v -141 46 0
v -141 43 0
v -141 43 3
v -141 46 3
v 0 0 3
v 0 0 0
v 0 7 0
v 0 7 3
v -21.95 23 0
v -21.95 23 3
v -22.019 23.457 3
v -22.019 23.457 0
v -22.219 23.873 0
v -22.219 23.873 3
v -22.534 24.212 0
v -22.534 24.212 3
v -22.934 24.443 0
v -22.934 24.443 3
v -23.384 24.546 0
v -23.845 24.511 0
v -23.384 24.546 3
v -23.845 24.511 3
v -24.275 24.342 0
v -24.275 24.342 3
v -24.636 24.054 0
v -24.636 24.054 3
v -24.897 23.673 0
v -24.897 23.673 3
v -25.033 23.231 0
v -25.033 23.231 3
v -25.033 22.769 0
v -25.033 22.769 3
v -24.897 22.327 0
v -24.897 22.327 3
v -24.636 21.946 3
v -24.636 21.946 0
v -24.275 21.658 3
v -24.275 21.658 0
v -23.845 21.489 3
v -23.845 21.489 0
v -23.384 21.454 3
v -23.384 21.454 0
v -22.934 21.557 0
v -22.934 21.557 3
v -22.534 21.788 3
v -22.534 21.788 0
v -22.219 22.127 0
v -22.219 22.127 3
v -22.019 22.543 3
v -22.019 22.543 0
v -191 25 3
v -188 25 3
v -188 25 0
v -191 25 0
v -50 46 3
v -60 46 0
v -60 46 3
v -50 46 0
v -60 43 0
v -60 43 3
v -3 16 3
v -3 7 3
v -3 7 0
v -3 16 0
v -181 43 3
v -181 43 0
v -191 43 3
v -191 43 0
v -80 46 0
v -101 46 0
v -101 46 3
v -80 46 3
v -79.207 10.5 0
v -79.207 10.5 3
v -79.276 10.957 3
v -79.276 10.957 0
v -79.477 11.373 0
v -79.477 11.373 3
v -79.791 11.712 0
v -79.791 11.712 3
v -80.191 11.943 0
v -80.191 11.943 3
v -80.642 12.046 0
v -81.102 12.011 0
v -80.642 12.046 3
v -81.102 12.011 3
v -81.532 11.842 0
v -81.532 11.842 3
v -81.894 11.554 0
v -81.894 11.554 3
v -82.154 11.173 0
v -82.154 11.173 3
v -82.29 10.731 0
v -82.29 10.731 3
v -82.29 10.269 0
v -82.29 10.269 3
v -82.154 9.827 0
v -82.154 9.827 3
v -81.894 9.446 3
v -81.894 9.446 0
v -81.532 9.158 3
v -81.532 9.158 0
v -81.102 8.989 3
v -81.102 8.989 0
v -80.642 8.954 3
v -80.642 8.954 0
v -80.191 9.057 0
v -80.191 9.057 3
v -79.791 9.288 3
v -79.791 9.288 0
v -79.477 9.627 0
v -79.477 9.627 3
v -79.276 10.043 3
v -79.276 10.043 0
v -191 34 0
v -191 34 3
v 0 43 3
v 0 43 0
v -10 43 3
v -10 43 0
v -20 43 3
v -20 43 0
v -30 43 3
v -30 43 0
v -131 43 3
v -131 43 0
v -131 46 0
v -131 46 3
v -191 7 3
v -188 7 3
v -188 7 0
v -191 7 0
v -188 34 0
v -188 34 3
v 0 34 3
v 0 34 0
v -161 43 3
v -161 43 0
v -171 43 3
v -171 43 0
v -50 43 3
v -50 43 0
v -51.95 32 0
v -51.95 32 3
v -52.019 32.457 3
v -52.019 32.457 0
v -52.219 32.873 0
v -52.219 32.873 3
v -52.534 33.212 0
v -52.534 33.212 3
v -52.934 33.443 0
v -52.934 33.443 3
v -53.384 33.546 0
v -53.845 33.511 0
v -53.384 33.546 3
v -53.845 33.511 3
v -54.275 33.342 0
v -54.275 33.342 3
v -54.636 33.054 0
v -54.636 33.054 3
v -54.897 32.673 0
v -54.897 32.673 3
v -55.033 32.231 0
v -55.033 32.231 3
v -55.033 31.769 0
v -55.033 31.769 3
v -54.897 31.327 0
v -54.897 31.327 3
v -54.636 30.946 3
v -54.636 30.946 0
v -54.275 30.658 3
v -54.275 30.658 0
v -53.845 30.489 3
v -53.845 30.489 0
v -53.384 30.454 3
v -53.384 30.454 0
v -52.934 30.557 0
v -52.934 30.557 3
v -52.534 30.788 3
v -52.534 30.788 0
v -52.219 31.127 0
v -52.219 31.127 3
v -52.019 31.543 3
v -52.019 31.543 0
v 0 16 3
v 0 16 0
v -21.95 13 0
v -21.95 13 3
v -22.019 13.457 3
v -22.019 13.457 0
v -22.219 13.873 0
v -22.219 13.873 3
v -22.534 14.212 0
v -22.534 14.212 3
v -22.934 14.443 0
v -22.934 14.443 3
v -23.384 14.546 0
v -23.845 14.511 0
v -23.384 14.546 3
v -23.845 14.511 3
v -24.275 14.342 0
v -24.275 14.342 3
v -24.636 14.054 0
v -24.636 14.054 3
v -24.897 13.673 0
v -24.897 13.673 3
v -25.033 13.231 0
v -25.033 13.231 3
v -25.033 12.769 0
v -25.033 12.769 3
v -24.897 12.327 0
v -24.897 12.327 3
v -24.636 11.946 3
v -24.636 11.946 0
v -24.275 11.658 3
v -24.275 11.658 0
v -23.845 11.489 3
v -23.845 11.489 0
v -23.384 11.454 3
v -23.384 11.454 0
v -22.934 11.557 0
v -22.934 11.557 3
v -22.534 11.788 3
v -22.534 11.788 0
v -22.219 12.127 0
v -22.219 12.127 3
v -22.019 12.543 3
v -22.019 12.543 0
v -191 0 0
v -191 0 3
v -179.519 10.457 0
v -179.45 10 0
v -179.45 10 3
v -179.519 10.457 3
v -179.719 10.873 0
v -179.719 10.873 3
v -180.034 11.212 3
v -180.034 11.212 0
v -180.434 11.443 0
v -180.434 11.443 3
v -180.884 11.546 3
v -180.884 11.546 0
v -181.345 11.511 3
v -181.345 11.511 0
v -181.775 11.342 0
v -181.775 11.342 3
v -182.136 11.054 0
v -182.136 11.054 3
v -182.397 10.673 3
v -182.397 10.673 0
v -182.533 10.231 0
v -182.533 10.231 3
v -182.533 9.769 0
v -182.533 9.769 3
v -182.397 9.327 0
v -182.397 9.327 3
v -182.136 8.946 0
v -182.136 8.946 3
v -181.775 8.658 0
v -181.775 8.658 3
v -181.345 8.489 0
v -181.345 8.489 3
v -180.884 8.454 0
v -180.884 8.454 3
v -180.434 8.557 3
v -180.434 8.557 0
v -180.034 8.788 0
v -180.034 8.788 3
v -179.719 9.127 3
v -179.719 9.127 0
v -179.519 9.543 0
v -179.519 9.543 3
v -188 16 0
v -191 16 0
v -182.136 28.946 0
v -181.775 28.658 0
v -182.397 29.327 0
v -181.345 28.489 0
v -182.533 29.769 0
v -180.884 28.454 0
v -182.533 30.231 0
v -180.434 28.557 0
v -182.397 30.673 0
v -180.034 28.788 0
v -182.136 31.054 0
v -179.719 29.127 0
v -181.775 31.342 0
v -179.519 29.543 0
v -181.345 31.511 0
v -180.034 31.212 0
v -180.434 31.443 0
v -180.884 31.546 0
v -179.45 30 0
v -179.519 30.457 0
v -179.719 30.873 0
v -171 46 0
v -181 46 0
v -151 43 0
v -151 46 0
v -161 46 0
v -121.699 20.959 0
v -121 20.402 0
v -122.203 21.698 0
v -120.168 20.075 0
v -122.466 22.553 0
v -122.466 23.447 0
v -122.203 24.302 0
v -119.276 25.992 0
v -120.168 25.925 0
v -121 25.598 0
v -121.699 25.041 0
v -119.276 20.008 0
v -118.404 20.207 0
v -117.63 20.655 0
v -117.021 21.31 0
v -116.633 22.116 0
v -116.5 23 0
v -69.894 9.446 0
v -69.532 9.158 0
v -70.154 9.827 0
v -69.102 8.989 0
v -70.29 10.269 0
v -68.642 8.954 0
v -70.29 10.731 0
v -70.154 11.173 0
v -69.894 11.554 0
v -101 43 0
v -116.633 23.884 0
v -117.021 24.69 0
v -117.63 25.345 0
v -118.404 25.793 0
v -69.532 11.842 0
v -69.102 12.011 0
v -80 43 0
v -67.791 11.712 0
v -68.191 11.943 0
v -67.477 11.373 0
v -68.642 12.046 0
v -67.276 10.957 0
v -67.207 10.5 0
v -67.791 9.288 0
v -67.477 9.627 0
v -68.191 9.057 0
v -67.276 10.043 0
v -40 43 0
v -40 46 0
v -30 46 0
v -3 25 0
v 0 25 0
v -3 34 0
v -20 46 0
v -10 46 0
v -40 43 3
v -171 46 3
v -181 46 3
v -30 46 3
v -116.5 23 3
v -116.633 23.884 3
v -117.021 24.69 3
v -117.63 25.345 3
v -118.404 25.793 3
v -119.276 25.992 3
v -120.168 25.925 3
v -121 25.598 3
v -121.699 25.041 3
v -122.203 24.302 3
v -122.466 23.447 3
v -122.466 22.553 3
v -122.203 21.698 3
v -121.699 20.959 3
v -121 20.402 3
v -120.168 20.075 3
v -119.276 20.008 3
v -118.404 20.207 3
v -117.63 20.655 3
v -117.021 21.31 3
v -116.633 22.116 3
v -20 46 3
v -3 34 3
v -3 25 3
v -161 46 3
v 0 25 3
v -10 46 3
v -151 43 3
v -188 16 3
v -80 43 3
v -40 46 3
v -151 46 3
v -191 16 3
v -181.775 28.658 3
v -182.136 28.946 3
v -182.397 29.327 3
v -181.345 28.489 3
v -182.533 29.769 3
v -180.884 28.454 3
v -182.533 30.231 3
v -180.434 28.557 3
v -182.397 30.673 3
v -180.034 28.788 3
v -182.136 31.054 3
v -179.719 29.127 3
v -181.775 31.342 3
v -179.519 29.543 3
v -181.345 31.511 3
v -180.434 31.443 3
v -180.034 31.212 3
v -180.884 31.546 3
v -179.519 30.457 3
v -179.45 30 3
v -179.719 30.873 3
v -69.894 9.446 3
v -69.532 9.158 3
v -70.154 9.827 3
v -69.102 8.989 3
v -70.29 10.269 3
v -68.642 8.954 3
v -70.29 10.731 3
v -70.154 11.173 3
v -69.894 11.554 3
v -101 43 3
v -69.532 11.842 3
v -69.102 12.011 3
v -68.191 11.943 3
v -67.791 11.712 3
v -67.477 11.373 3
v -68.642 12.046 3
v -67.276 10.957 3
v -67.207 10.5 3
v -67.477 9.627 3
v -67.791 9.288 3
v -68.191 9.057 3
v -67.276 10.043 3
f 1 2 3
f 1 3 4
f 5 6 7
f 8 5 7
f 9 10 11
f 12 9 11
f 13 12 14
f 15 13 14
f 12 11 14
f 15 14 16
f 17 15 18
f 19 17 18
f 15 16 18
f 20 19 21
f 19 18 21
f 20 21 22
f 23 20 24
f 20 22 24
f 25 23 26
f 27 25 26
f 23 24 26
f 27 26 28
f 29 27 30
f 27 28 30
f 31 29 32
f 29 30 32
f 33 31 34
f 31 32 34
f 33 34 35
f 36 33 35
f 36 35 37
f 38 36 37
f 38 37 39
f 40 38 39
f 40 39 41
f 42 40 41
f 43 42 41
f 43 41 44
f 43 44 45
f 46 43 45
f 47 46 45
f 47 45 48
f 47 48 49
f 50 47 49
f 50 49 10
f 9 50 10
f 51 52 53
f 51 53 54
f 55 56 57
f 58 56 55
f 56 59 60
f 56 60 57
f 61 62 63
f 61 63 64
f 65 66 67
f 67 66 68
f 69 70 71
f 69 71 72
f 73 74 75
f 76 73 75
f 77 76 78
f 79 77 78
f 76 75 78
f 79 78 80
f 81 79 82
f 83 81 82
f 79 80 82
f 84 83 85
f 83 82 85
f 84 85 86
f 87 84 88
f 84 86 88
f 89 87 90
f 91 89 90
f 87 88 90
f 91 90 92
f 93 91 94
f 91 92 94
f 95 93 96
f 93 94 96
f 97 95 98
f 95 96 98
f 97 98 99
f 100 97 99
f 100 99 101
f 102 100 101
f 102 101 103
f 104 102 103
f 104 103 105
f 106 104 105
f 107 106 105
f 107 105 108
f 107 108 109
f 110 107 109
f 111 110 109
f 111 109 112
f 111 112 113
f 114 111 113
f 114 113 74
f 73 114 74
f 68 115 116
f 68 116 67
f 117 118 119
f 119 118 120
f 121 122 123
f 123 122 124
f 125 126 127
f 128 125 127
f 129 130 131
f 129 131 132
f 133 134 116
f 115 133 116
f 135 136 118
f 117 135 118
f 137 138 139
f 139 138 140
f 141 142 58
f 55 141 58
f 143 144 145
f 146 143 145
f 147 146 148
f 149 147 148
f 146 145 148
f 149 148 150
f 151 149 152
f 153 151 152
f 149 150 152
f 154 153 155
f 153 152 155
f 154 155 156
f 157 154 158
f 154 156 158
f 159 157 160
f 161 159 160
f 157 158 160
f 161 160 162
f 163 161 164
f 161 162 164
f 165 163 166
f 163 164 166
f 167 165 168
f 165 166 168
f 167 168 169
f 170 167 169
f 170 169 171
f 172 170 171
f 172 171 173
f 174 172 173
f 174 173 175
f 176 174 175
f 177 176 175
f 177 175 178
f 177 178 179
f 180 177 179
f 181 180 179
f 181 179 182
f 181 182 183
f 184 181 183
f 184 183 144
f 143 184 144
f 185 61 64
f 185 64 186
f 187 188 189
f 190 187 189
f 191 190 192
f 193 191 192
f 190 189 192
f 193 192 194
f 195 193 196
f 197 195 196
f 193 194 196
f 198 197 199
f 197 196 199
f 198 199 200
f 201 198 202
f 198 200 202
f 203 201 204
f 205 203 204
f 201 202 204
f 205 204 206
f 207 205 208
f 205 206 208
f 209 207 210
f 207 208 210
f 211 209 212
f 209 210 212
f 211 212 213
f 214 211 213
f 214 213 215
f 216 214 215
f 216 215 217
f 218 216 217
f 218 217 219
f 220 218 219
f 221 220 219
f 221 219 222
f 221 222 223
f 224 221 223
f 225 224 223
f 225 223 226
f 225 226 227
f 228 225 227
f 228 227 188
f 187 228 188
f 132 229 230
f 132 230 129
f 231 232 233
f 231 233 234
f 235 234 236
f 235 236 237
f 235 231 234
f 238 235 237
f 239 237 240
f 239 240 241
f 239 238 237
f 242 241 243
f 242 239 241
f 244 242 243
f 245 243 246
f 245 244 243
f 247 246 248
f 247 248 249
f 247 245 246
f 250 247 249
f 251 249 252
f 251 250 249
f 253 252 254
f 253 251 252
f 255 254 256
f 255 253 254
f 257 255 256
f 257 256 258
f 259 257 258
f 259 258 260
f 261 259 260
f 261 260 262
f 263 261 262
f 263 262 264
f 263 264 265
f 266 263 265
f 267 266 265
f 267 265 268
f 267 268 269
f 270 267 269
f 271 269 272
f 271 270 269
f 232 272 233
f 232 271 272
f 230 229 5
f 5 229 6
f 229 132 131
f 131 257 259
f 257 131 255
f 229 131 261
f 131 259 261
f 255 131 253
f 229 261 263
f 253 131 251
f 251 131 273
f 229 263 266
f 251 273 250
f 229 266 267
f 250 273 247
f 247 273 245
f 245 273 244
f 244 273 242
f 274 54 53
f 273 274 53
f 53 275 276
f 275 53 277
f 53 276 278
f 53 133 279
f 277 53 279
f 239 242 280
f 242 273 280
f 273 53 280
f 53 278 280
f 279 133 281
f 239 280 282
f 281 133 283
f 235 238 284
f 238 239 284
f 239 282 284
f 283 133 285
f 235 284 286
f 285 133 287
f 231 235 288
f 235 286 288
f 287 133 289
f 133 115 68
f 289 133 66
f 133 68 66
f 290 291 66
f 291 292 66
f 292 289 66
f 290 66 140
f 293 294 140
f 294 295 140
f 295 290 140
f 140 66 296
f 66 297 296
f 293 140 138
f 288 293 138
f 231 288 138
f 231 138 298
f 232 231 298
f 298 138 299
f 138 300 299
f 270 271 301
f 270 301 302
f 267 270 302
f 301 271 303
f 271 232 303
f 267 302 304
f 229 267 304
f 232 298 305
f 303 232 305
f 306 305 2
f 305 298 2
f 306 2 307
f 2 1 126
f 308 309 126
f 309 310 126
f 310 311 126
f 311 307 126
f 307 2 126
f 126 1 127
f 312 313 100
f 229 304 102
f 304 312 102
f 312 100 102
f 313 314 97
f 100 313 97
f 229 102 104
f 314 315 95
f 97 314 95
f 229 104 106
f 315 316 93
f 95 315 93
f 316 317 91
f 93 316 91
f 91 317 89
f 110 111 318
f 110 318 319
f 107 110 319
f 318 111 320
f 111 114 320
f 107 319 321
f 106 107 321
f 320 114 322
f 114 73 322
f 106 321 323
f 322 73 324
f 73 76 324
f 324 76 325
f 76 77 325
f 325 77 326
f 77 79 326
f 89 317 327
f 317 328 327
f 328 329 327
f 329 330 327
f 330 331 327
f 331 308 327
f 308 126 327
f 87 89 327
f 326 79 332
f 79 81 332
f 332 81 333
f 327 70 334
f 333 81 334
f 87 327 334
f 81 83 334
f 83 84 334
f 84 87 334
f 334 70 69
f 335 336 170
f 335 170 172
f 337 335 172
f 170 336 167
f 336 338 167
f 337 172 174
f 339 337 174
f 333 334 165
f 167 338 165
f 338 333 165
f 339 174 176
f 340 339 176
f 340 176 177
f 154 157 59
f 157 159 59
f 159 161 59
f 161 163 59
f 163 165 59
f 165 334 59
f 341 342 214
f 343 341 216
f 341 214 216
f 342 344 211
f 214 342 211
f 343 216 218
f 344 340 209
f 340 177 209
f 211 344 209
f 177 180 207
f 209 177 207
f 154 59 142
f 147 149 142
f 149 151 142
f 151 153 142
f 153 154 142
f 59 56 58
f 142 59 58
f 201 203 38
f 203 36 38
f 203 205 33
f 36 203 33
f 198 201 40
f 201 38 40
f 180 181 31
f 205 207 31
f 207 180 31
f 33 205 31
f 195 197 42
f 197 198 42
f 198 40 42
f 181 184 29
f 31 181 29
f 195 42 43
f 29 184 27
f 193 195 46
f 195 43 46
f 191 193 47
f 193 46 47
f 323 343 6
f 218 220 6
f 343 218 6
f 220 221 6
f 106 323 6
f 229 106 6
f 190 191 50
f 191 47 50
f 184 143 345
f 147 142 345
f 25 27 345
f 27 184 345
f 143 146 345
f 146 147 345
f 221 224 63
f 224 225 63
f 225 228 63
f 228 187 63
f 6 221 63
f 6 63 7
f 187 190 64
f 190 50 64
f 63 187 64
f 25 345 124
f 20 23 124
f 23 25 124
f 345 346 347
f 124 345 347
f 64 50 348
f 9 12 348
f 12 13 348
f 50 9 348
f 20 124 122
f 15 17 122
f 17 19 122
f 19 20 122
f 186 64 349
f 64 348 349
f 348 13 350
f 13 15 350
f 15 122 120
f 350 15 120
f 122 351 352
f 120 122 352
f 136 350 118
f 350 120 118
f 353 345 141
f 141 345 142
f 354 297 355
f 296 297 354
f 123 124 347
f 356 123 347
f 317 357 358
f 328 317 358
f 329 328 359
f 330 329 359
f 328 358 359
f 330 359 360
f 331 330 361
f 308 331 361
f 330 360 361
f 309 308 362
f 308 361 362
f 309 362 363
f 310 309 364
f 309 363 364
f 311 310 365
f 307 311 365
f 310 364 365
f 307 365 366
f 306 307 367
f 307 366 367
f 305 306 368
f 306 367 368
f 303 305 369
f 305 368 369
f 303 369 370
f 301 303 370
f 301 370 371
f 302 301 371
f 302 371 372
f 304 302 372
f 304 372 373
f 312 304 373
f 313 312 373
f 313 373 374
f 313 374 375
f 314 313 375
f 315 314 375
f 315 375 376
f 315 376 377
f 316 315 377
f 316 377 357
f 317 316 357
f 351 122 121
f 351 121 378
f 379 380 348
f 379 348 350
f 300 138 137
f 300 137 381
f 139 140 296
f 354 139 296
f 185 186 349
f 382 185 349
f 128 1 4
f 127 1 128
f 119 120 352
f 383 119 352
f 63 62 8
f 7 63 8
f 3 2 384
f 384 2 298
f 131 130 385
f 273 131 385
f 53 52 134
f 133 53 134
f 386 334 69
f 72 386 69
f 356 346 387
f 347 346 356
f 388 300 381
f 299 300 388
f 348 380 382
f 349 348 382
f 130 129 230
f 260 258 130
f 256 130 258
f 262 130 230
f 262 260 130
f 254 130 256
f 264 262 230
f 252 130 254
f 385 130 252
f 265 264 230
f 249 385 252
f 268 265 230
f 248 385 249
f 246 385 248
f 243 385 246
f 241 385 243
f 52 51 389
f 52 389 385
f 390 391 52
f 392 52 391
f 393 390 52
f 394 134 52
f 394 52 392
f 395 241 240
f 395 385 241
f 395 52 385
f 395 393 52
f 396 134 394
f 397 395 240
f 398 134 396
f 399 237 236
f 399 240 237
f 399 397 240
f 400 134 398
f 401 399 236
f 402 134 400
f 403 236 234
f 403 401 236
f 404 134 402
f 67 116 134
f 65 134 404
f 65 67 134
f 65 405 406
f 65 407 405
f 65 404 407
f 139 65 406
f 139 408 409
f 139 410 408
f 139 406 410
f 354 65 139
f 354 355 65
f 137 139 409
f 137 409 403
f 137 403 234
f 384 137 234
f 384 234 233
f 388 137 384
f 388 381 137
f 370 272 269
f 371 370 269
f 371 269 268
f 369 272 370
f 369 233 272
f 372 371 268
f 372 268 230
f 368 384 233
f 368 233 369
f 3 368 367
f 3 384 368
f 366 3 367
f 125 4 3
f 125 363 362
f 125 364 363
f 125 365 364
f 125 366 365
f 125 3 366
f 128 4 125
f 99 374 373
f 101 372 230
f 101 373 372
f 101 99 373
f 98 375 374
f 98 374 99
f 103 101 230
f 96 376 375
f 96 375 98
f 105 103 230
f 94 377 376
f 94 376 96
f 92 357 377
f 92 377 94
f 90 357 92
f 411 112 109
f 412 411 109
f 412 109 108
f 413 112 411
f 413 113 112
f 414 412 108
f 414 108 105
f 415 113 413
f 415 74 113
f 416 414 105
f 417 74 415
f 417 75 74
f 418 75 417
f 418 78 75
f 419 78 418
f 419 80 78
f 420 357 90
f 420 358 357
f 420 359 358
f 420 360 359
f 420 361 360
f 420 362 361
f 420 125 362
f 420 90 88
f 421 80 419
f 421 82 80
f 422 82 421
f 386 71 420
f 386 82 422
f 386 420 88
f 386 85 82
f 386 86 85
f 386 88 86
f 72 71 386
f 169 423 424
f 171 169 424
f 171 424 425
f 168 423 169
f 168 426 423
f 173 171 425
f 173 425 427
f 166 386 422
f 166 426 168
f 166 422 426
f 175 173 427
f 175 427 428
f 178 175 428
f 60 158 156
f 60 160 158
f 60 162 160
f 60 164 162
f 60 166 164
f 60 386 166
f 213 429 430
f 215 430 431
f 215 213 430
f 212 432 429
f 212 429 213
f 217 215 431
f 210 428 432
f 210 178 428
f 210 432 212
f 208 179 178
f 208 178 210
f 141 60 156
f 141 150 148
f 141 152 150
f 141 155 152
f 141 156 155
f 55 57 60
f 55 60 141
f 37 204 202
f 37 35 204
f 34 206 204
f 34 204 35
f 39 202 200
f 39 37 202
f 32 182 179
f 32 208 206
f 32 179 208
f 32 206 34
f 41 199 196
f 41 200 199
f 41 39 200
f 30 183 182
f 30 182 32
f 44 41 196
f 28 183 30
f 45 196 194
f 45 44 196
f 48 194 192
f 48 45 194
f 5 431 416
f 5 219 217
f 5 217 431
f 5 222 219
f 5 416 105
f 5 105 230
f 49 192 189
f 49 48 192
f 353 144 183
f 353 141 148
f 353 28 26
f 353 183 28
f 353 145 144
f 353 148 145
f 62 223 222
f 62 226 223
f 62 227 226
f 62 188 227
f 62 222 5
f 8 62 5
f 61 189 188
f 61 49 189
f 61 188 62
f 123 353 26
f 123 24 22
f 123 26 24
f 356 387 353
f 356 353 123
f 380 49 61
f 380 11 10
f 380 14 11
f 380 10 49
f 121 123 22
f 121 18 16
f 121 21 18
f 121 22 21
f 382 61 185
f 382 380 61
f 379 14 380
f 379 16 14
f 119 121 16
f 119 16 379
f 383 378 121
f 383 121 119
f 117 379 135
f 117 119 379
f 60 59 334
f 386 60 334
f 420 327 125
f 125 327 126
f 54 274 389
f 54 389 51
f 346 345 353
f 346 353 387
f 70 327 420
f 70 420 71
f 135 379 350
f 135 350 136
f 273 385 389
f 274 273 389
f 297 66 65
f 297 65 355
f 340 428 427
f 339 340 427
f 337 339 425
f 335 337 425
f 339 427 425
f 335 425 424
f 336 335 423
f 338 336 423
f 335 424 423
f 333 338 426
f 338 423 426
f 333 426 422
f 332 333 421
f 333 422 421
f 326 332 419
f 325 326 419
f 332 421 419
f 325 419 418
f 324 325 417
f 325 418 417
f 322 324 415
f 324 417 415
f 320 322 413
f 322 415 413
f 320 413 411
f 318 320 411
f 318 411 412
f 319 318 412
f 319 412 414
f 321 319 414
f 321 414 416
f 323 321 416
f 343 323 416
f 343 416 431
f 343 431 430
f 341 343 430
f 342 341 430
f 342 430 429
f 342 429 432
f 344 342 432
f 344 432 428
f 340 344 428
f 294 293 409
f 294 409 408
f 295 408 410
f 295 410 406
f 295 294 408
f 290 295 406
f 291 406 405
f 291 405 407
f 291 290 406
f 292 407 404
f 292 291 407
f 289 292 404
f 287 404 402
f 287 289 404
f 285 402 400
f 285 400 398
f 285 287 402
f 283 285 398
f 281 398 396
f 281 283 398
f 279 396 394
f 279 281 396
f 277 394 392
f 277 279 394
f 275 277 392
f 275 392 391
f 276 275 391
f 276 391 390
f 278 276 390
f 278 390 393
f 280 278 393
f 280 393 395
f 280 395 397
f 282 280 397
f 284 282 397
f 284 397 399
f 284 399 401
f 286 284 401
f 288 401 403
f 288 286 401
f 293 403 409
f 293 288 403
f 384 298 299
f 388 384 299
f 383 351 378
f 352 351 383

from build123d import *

# Parameters (mm, degrees)
SKETCH1_W           = 191
SKETCH1_H           = 46
SKETCH1_R           = 1.549999948
BOSS_EXTRUDE1_DEPTH = 3
CUT_EXTRUDE1_REACH  = 198.484
SKETCH3_W           = 10
SKETCH3_H           = 3
SKETCH3_W_2         = 30
SKETCH3_W_3         = 20
CUT_EXTRUDE2_REACH  = 198.484
SKETCH4_W           = 3
SKETCH4_H           = 9
CUT_EXTRUDE3_REACH  = 198.484
SKETCH6_R           = 3
CUT_EXTRUDE4_REACH  = 198.484
SKETCH7_R           = 1.55


with BuildPart() as part:
    # Sketch1 → Boss-Extrude1 (new body)
    with BuildSketch(Plane.XY):
        with Locations((-95.5, 23)):
            Rectangle(SKETCH1_W, SKETCH1_H)
        with Locations((-181, 30)):
            Circle(SKETCH1_R, mode=Mode.SUBTRACT)
        with Locations((-181, 10)):
            Circle(SKETCH1_R, mode=Mode.SUBTRACT)
    extrude(amount=BOSS_EXTRUDE1_DEPTH)

    # Sketch3 → Cut-Extrude1 (cut, up to next)
    with BuildSketch(Plane(origin=(0, 0, 0), x_dir=(-1, 0, 0), z_dir=(0, 0, -1)), mode=Mode.PRIVATE) as cut_extrude1_sk1:
        with Locations((45, 44.5)):
            Rectangle(SKETCH3_W, SKETCH3_H)
    cut_extrude1_tool1 = extrude(cut_extrude1_sk1.sketch, amount=-CUT_EXTRUDE1_REACH, mode=Mode.PRIVATE) & part.part
    # Sketch3 → Cut-Extrude1 (cut, up to next)
    with BuildSketch(Plane(origin=(0, 0, 0), x_dir=(-1, 0, 0), z_dir=(0, 0, -1)), mode=Mode.PRIVATE) as cut_extrude1_sk2:
        with Locations((25, 44.5)):
            Rectangle(SKETCH3_W, SKETCH3_H)
    cut_extrude1_tool2 = extrude(cut_extrude1_sk2.sketch, amount=-CUT_EXTRUDE1_REACH, mode=Mode.PRIVATE) & part.part
    # Sketch3 → Cut-Extrude1 (cut, up to next)
    with BuildSketch(Plane(origin=(0, 0, 0), x_dir=(-1, 0, 0), z_dir=(0, 0, -1)), mode=Mode.PRIVATE) as cut_extrude1_sk3:
        with Locations((5, 44.5)):
            Rectangle(SKETCH3_W, SKETCH3_H)
    cut_extrude1_tool3 = extrude(cut_extrude1_sk3.sketch, amount=-CUT_EXTRUDE1_REACH, mode=Mode.PRIVATE) & part.part
    # Sketch3 → Cut-Extrude1 (cut, up to next)
    with BuildSketch(Plane(origin=(0, 0, 0), x_dir=(-1, 0, 0), z_dir=(0, 0, -1)), mode=Mode.PRIVATE) as cut_extrude1_sk4:
        with Locations((166, 44.5)):
            Rectangle(SKETCH3_W, SKETCH3_H)
    cut_extrude1_tool4 = extrude(cut_extrude1_sk4.sketch, amount=-CUT_EXTRUDE1_REACH, mode=Mode.PRIVATE) & part.part
    # Sketch3 → Cut-Extrude1 (cut, up to next)
    with BuildSketch(Plane(origin=(0, 0, 0), x_dir=(-1, 0, 0), z_dir=(0, 0, -1)), mode=Mode.PRIVATE) as cut_extrude1_sk5:
        with Locations((146, 44.5)):
            Rectangle(SKETCH3_W, SKETCH3_H)
    cut_extrude1_tool5 = extrude(cut_extrude1_sk5.sketch, amount=-CUT_EXTRUDE1_REACH, mode=Mode.PRIVATE) & part.part
    # Sketch3 → Cut-Extrude1 (cut, up to next)
    with BuildSketch(Plane(origin=(0, 0, 0), x_dir=(-1, 0, 0), z_dir=(0, 0, -1)), mode=Mode.PRIVATE) as cut_extrude1_sk6:
        with Locations((116, 44.5)):
            Rectangle(SKETCH3_W_2, SKETCH3_H)
    cut_extrude1_tool6 = extrude(cut_extrude1_sk6.sketch, amount=-CUT_EXTRUDE1_REACH, mode=Mode.PRIVATE) & part.part
    # Sketch3 → Cut-Extrude1 (cut, up to next)
    with BuildSketch(Plane(origin=(0, 0, 0), x_dir=(-1, 0, 0), z_dir=(0, 0, -1)), mode=Mode.PRIVATE) as cut_extrude1_sk7:
        with Locations((70, 44.5)):
            Rectangle(SKETCH3_W_3, SKETCH3_H)
    cut_extrude1_tool7 = extrude(cut_extrude1_sk7.sketch, amount=-CUT_EXTRUDE1_REACH, mode=Mode.PRIVATE) & part.part
    # Sketch3 → Cut-Extrude1 (cut, up to next)
    with BuildSketch(Plane(origin=(0, 0, 0), x_dir=(-1, 0, 0), z_dir=(0, 0, -1)), mode=Mode.PRIVATE) as cut_extrude1_sk8:
        with Locations((186, 44.5)):
            Rectangle(SKETCH3_W, SKETCH3_H)
    cut_extrude1_tool8 = extrude(cut_extrude1_sk8.sketch, amount=-CUT_EXTRUDE1_REACH, mode=Mode.PRIVATE) & part.part
    add(cut_extrude1_tool1.solids().sort_by_distance((-45, 44.5, 0))[0], mode=Mode.SUBTRACT)
    add(cut_extrude1_tool2.solids().sort_by_distance((-25, 44.5, 0))[0], mode=Mode.SUBTRACT)
    add(cut_extrude1_tool3.solids().sort_by_distance((-5, 44.5, 0))[0], mode=Mode.SUBTRACT)
    add(cut_extrude1_tool4.solids().sort_by_distance((-166, 44.5, 0))[0], mode=Mode.SUBTRACT)
    add(cut_extrude1_tool5.solids().sort_by_distance((-146, 44.5, 0))[0], mode=Mode.SUBTRACT)
    add(cut_extrude1_tool6.solids().sort_by_distance((-116, 44.5, 0))[0], mode=Mode.SUBTRACT)
    add(cut_extrude1_tool7.solids().sort_by_distance((-70, 44.5, 0))[0], mode=Mode.SUBTRACT)
    add(cut_extrude1_tool8.solids().sort_by_distance((-186, 44.5, 0))[0], mode=Mode.SUBTRACT)

    # Sketch4 → Cut-Extrude2 (cut, up to next)
    with BuildSketch(Plane.XY.offset(3), mode=Mode.PRIVATE) as cut_extrude2_sk1:
        with Locations((-1.5, 29.5)):
            Rectangle(SKETCH4_W, SKETCH4_H)
    cut_extrude2_tool1 = extrude(cut_extrude2_sk1.sketch, amount=-CUT_EXTRUDE2_REACH, mode=Mode.PRIVATE) & part.part
    # Sketch4 → Cut-Extrude2 (cut, up to next)
    with BuildSketch(Plane.XY.offset(3), mode=Mode.PRIVATE) as cut_extrude2_sk2:
        with Locations((-1.5, 11.5)):
            Rectangle(SKETCH4_W, SKETCH4_H)
    cut_extrude2_tool2 = extrude(cut_extrude2_sk2.sketch, amount=-CUT_EXTRUDE2_REACH, mode=Mode.PRIVATE) & part.part
    cut_extrude2_1 = cut_extrude2_tool1.solids().sort_by_distance((-1.5, 29.5, 3))[0]
    add(cut_extrude2_1, mode=Mode.SUBTRACT)
    cut_extrude2_2 = cut_extrude2_tool2.solids().sort_by_distance((-1.5, 11.5, 3))[0]
    add(cut_extrude2_2, mode=Mode.SUBTRACT)
    cut_extrude2 = cut_extrude2_1 + cut_extrude2_2  # Cut-Extrude2 as one shape, for the pattern or mirror that repeats it

    # Mirror1: Cut-Extrude2 across plane
    add(cut_extrude2.mirror(Plane(origin=(-95.5, 0, 0), x_dir=(0, 0, 1), z_dir=(1, 0, 0))), mode=Mode.SUBTRACT)

    # Sketch6 → Cut-Extrude3 (cut, up to next)
    with BuildSketch(Plane.XY.offset(3), mode=Mode.PRIVATE) as cut_extrude3_sk1:
        with Locations((-119.5, 23)):
            Circle(SKETCH6_R)
    cut_extrude3_tool1 = extrude(cut_extrude3_sk1.sketch, amount=-CUT_EXTRUDE3_REACH, mode=Mode.PRIVATE) & part.part
    add(cut_extrude3_tool1.solids().sort_by_distance((-119.5, 23, 3))[0], mode=Mode.SUBTRACT)

    # Sketch7 → Cut-Extrude4 (cut, up to next)
    with BuildSketch(Plane.XY.offset(3), mode=Mode.PRIVATE) as cut_extrude4_sk1:
        with Locations((-53.5, 32)):
            Circle(SKETCH7_R)
    cut_extrude4_tool1 = extrude(cut_extrude4_sk1.sketch, amount=-CUT_EXTRUDE4_REACH, mode=Mode.PRIVATE) & part.part
    # Sketch7 → Cut-Extrude4 (cut, up to next)
    with BuildSketch(Plane.XY.offset(3), mode=Mode.PRIVATE) as cut_extrude4_sk2:
        with Locations((-68.757359313, 10.5)):
            Circle(SKETCH7_R)
    cut_extrude4_tool2 = extrude(cut_extrude4_sk2.sketch, amount=-CUT_EXTRUDE4_REACH, mode=Mode.PRIVATE) & part.part
    # Sketch7 → Cut-Extrude4 (cut, up to next)
    with BuildSketch(Plane.XY.offset(3), mode=Mode.PRIVATE) as cut_extrude4_sk3:
        with Locations((-80.757359313, 10.5)):
            Circle(SKETCH7_R)
    cut_extrude4_tool3 = extrude(cut_extrude4_sk3.sketch, amount=-CUT_EXTRUDE4_REACH, mode=Mode.PRIVATE) & part.part
    # Sketch7 → Cut-Extrude4 (cut, up to next)
    with BuildSketch(Plane.XY.offset(3), mode=Mode.PRIVATE) as cut_extrude4_sk4:
        with Locations((-23.5, 23)):
            Circle(SKETCH7_R)
    cut_extrude4_tool4 = extrude(cut_extrude4_sk4.sketch, amount=-CUT_EXTRUDE4_REACH, mode=Mode.PRIVATE) & part.part
    # Sketch7 → Cut-Extrude4 (cut, up to next)
    with BuildSketch(Plane.XY.offset(3), mode=Mode.PRIVATE) as cut_extrude4_sk5:
        with Locations((-23.5, 13)):
            Circle(SKETCH7_R)
    cut_extrude4_tool5 = extrude(cut_extrude4_sk5.sketch, amount=-CUT_EXTRUDE4_REACH, mode=Mode.PRIVATE) & part.part
    add(cut_extrude4_tool1.solids().sort_by_distance((-53.5, 32, 3))[0], mode=Mode.SUBTRACT)
    add(cut_extrude4_tool2.solids().sort_by_distance((-68.757359, 10.5, 3))[0], mode=Mode.SUBTRACT)
    add(cut_extrude4_tool3.solids().sort_by_distance((-80.757359, 10.5, 3))[0], mode=Mode.SUBTRACT)
    add(cut_extrude4_tool4.solids().sort_by_distance((-23.5, 23, 3))[0], mode=Mode.SUBTRACT)
    add(cut_extrude4_tool5.solids().sort_by_distance((-23.5, 13, 3))[0], mode=Mode.SUBTRACT)


solid = part.part
